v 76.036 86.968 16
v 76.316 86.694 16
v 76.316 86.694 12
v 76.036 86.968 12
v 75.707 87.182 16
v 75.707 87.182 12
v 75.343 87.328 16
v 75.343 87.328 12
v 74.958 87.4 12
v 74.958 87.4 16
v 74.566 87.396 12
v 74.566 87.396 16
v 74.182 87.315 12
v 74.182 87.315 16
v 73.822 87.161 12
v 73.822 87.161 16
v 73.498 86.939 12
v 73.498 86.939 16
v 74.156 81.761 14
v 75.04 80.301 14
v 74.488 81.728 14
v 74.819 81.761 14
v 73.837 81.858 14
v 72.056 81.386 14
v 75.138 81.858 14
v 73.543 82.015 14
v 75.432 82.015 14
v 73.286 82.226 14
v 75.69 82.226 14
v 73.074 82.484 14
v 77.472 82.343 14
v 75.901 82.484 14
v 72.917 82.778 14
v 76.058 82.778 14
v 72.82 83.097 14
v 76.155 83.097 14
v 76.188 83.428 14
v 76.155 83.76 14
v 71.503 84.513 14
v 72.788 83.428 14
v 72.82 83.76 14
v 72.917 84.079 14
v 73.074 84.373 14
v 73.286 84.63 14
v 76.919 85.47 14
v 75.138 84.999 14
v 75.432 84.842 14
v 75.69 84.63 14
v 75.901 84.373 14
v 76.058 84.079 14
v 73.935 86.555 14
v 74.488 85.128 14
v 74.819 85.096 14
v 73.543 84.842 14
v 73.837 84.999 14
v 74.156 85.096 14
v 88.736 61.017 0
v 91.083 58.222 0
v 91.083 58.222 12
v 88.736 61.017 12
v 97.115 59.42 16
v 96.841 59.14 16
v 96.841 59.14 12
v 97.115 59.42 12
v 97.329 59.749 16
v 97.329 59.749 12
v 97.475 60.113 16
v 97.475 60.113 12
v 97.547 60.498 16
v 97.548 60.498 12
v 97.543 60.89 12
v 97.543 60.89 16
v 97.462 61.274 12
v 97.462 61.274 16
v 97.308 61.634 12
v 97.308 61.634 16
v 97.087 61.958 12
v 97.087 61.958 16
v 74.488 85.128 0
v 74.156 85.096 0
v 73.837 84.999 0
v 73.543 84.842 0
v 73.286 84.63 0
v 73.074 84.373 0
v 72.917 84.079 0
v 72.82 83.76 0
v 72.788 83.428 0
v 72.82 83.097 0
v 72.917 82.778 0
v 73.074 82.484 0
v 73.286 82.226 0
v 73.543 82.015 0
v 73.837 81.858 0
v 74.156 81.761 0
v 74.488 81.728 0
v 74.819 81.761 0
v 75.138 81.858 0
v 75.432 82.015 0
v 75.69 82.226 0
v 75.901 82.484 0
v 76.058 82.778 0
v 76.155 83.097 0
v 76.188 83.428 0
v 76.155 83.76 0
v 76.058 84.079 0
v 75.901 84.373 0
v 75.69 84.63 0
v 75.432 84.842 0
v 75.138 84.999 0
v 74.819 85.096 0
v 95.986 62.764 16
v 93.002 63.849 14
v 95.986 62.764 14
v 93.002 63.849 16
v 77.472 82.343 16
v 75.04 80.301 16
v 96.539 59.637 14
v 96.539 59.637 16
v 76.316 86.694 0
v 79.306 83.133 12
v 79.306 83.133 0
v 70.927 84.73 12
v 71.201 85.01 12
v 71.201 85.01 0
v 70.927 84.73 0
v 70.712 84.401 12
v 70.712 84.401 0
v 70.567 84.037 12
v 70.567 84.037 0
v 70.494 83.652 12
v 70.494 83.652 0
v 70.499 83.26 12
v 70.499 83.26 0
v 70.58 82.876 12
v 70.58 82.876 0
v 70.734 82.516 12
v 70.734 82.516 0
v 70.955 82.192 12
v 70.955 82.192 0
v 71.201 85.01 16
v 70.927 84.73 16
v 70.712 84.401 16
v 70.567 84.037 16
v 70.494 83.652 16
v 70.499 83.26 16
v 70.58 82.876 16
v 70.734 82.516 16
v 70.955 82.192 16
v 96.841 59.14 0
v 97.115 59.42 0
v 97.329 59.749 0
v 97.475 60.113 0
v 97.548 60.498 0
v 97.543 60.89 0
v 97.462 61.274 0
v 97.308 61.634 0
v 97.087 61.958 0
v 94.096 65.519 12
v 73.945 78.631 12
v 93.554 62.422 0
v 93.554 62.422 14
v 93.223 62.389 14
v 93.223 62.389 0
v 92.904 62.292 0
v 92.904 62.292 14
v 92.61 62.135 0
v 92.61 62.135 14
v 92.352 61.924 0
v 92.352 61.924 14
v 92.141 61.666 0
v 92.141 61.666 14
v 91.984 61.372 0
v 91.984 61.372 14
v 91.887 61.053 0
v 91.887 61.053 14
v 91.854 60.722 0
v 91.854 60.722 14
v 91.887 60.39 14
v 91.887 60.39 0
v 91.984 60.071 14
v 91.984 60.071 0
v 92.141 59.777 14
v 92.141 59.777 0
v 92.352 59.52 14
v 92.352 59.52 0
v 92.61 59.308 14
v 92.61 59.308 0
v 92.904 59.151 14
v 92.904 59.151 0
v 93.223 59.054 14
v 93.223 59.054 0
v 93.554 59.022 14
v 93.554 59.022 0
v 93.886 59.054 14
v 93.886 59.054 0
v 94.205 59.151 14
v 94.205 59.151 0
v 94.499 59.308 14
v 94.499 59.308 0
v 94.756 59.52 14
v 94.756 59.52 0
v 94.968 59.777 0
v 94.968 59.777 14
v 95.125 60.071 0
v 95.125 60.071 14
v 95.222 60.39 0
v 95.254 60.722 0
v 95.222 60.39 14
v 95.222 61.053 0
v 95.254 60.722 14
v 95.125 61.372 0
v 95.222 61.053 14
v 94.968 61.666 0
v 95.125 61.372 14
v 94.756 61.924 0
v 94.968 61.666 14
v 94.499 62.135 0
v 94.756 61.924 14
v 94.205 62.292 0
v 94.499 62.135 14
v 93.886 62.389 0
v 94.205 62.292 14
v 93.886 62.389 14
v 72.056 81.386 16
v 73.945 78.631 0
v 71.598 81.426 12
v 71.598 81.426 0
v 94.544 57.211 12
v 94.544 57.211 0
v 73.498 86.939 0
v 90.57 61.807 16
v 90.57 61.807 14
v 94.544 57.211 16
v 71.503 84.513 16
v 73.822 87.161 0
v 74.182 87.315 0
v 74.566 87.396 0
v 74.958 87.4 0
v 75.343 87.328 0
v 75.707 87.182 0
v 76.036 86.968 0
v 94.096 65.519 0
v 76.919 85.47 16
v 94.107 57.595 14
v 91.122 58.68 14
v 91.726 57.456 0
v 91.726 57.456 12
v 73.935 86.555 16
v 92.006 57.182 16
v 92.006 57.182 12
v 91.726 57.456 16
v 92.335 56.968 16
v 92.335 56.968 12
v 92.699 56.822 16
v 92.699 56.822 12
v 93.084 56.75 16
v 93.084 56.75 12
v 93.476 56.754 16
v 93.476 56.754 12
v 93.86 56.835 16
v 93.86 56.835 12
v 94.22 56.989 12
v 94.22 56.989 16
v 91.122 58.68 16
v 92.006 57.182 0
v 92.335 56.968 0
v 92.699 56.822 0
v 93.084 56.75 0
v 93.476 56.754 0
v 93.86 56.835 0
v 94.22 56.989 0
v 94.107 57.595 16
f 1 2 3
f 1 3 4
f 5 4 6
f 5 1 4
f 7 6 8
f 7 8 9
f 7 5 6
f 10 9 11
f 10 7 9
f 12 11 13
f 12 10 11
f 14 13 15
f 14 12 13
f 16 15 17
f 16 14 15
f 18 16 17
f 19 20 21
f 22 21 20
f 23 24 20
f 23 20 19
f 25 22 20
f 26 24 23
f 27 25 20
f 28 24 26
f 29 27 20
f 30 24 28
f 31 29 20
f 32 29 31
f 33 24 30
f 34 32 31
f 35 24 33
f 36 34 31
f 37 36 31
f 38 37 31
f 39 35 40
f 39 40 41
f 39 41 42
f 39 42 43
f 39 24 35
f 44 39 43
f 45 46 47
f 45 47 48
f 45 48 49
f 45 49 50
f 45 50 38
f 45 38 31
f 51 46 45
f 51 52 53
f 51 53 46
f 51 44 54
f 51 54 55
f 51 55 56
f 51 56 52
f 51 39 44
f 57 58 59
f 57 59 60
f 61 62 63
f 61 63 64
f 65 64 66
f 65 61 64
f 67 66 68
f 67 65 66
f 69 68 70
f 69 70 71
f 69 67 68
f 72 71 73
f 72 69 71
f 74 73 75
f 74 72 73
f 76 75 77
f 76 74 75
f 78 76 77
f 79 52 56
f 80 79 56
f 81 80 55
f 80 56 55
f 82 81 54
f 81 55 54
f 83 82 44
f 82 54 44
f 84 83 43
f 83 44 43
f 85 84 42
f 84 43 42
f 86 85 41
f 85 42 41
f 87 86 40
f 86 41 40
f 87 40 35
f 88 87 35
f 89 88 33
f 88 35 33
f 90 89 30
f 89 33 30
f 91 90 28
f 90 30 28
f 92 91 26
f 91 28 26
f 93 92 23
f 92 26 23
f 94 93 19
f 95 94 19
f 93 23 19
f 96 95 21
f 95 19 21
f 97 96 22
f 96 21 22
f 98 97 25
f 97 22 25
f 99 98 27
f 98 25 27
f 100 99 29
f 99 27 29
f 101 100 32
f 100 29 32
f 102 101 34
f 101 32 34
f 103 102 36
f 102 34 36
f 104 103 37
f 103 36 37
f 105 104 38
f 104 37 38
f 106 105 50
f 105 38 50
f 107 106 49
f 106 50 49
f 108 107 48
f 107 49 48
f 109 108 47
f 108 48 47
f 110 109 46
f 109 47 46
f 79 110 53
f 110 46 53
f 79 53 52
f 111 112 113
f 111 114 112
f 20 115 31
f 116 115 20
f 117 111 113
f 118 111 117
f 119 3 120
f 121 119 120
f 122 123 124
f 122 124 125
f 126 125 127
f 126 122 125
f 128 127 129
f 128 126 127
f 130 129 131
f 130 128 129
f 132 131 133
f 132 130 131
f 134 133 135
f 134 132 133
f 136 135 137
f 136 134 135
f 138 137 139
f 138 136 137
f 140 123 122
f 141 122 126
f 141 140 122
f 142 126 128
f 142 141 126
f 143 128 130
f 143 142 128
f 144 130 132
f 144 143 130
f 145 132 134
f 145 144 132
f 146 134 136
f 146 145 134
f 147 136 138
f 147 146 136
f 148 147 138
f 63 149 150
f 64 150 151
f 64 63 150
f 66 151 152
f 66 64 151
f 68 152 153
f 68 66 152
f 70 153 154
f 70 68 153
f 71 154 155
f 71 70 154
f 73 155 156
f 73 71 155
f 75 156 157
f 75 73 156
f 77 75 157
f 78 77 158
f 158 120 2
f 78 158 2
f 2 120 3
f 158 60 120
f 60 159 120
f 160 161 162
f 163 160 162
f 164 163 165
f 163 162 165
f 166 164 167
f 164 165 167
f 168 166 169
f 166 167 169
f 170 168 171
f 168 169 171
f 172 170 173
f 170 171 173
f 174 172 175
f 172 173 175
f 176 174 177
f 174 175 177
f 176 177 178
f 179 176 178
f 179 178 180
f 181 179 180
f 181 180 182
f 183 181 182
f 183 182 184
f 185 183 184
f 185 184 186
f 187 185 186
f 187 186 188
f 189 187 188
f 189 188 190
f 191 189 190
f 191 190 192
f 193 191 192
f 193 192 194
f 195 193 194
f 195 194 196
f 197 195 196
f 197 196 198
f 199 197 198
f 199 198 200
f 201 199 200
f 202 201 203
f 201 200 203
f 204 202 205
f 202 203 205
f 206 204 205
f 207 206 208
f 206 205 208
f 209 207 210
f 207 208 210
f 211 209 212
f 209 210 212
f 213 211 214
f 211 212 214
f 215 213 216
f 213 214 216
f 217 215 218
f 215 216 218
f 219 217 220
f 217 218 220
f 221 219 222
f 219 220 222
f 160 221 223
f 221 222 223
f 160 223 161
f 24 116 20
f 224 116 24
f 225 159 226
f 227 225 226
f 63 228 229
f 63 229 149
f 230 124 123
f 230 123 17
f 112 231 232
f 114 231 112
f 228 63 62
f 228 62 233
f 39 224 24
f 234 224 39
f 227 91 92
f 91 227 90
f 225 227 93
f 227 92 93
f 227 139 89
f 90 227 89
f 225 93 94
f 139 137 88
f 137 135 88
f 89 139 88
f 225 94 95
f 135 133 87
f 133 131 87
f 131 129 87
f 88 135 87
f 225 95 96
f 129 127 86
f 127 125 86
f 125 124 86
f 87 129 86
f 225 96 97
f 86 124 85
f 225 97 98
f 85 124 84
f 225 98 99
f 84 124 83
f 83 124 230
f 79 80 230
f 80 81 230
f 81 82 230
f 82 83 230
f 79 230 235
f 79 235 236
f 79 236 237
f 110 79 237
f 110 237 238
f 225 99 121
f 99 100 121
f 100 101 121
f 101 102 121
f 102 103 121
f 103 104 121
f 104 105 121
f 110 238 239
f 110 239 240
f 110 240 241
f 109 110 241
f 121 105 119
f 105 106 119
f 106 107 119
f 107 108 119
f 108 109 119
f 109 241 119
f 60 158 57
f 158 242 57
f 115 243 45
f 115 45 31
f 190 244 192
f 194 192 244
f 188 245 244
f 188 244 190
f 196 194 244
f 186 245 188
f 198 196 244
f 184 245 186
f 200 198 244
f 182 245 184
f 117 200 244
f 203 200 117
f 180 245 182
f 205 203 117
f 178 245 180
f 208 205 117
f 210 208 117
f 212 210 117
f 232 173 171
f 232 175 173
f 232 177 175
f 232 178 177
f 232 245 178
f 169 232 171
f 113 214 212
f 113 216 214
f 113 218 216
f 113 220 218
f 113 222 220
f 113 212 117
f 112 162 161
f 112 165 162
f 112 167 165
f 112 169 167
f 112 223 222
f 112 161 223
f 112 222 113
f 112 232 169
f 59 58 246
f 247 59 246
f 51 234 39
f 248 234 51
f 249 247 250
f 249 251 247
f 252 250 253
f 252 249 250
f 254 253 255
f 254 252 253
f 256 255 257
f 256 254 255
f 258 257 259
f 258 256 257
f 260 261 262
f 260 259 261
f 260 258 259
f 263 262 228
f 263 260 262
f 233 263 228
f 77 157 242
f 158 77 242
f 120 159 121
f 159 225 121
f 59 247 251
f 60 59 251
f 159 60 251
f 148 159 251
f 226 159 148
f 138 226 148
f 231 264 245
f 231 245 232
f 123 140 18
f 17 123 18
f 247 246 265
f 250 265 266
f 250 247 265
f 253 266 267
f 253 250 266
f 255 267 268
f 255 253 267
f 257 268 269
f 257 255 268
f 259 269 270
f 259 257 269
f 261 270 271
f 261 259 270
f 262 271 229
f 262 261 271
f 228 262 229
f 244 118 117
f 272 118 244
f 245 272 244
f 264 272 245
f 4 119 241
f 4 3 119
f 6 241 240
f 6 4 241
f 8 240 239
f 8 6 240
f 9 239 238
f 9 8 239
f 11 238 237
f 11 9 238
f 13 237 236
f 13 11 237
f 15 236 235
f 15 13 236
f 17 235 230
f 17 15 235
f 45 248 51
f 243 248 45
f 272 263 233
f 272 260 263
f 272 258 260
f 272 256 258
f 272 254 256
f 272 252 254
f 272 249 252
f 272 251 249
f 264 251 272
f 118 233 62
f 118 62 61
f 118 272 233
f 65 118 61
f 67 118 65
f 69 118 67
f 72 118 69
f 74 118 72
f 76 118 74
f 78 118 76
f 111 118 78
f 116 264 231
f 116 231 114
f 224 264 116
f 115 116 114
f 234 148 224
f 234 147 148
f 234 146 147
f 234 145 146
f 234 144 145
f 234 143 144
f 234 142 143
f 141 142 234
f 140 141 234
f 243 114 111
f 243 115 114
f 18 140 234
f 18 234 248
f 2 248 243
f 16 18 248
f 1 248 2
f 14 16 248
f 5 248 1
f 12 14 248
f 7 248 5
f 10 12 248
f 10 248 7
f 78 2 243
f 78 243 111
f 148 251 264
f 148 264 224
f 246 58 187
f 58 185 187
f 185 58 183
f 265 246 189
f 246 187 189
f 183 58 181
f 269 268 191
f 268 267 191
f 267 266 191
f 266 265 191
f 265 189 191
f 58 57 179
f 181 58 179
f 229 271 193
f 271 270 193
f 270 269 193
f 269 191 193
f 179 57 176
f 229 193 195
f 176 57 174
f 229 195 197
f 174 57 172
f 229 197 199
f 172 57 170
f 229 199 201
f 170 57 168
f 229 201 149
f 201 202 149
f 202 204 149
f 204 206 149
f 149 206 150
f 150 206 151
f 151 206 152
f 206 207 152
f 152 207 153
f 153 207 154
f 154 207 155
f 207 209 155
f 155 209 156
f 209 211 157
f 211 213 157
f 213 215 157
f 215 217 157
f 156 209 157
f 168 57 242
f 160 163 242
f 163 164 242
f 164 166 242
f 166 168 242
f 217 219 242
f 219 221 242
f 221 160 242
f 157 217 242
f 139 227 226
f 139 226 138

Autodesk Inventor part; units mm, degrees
ref_plane "YZ Plane" through (0, 0, 0) normal (1, 0, 0) x (0, 1, 0)
sketch "Sketch1" plane through (0, 0, 0) normal (0, 0, 1) x (1, 0, 0)
  line L0 (91.0829, 58.2221) -> (71.5983, 81.4264) projected
  line L1 (73.9454, 78.6312) -> (81.7568, 85.1904) projected
  line L2 (96.5471, 67.5766) -> (88.7358, 61.0174) projected
  line L3 (71.5983, 81.4264) -> (69.6691, 83.7239)
  line L4 (69.6691, 83.7239) -> (75.0298, 88.2253)
  line L5 (75.0298, 88.2253) -> (79.3061, 83.1326)
  line L6 (91.0829, 58.2221) -> (93.0121, 55.9247)
  line L7 (93.0121, 55.9247) -> (98.3728, 60.4261)
  line L8 (98.3728, 60.4261) -> (94.0965, 65.5188)
  line L9 (81.3406, 69.8243) -> (102.4069, 87.5137) construction
  line L10 (91.726, 57.4563) -> (90.0029, 56.0094) projected
  line L11 (95.6925, 58.1754) -> (91.4161, 63.2681) construction
  line L12 (72.3494, 85.9746) -> (76.6258, 80.8819) construction
  point P0 (0, 0)
  point P1 (93.5543, 60.7217)
  point P2 (74.4876, 83.4282)
  dimension "d0" = 2
  dimension "d1" = 7
ref_plane "Work Plane1" through (72.2806, 68.9104, 57.5461) normal (0, 0, 1) x (0.7658175, 0.643058, 0)
ref_plane "Work Plane2" through (75.6298, 74.8001, 12) normal (0, 0, 1) x (0.7658175, 0.643058, 0)
extrude "Extrusion1" add sketch "Sketch1" along normal up to surface (12 mm away)
sketch "Sketch2" plane through (98.3728, 60.4261, 12) normal (0, 0, 1) x (0.7658175, 0.643058, 0)
  line L0 (0, 0) -> (0, 6.65) projected
  line L1 (-7, 29.65) -> (-7, 36.3) projected
  line L2 (0, 0) -> (-7, 0)
  line L3 (-7, 0) -> (-7, 36.3)
  line L4 (-7, 36.3) -> (0, 36.3)
  line L5 (0, 36.3) -> (0, 0)
  point P0 (-114.1931, 16.9841)
  point P1 (0, 6.65)
  point P2 (-7, 29.65)
extrude "Extrusion2" add sketch "Sketch2" along normal blind 4
hole "Hole1" at (74.4876, 83.4282, 0) at (93.5543, 60.7217, 0) direction (0, 0, 1) diameter 3.4 end through all clearance for "Countersunk Head GOST 12876-67" size "M3" standard "GOST"
fillet "Fillet1" radius 2 8 edges at (93.0121, 55.9247, 14) (93.0121, 55.9247, 6) (98.3728, 60.4261, 14) (98.3728, 60.4261, 6) (75.0298, 88.2253, 14) (75.0298, 88.2253, 6) (69.6691, 83.7239, 14) (69.6691, 83.7239, 6)
sketch "Sketch3" plane through (98.3728, 60.4261, 16) normal (0, 0, 1) x (0.7658175, 0.643058, 0)
  circle A0 centre (-3.5, 3.325) radius 1.7 projected
  circle A1 centre (-3.5, 32.975) radius 1.7 projected
  line L0 (-1.9123, 6.075) -> (-0.3246, 3.325)
  line L1 (-0.3246, 3.325) -> (-1.9123, 0.575)
  line L2 (-1.9123, 0.575) -> (-5.0877, 0.575)
  line L3 (-5.0877, 0.575) -> (-6.6754, 3.325)
  line L4 (-6.6754, 3.325) -> (-5.0877, 6.075)
  line L5 (-5.0877, 6.075) -> (-1.9123, 6.075)
  line L6 (-1.9123, 30.225) -> (-5.0877, 30.225)
  line L7 (-5.0877, 30.225) -> (-6.6754, 32.975)
  line L8 (-6.6754, 32.975) -> (-5.0877, 35.725)
  line L9 (-5.0877, 35.725) -> (-1.9123, 35.725)
  line L10 (-1.9123, 35.725) -> (-0.3246, 32.975)
  line L11 (-0.3246, 32.975) -> (-1.9123, 30.225)
  line L12 (-5, 0) -> (-2, 0) projected
  point P0 (-114.1931, 16.9841)
  point P1 (-3.5, 3.325)
  point P2 (-3.5, 32.975)
  dimension "d14" = 5.5
  dimension "d15" = 5.5
extrude "Extrusion3" cut sketch "Sketch3" against normal blind 2
properties part number "servo_holder"
